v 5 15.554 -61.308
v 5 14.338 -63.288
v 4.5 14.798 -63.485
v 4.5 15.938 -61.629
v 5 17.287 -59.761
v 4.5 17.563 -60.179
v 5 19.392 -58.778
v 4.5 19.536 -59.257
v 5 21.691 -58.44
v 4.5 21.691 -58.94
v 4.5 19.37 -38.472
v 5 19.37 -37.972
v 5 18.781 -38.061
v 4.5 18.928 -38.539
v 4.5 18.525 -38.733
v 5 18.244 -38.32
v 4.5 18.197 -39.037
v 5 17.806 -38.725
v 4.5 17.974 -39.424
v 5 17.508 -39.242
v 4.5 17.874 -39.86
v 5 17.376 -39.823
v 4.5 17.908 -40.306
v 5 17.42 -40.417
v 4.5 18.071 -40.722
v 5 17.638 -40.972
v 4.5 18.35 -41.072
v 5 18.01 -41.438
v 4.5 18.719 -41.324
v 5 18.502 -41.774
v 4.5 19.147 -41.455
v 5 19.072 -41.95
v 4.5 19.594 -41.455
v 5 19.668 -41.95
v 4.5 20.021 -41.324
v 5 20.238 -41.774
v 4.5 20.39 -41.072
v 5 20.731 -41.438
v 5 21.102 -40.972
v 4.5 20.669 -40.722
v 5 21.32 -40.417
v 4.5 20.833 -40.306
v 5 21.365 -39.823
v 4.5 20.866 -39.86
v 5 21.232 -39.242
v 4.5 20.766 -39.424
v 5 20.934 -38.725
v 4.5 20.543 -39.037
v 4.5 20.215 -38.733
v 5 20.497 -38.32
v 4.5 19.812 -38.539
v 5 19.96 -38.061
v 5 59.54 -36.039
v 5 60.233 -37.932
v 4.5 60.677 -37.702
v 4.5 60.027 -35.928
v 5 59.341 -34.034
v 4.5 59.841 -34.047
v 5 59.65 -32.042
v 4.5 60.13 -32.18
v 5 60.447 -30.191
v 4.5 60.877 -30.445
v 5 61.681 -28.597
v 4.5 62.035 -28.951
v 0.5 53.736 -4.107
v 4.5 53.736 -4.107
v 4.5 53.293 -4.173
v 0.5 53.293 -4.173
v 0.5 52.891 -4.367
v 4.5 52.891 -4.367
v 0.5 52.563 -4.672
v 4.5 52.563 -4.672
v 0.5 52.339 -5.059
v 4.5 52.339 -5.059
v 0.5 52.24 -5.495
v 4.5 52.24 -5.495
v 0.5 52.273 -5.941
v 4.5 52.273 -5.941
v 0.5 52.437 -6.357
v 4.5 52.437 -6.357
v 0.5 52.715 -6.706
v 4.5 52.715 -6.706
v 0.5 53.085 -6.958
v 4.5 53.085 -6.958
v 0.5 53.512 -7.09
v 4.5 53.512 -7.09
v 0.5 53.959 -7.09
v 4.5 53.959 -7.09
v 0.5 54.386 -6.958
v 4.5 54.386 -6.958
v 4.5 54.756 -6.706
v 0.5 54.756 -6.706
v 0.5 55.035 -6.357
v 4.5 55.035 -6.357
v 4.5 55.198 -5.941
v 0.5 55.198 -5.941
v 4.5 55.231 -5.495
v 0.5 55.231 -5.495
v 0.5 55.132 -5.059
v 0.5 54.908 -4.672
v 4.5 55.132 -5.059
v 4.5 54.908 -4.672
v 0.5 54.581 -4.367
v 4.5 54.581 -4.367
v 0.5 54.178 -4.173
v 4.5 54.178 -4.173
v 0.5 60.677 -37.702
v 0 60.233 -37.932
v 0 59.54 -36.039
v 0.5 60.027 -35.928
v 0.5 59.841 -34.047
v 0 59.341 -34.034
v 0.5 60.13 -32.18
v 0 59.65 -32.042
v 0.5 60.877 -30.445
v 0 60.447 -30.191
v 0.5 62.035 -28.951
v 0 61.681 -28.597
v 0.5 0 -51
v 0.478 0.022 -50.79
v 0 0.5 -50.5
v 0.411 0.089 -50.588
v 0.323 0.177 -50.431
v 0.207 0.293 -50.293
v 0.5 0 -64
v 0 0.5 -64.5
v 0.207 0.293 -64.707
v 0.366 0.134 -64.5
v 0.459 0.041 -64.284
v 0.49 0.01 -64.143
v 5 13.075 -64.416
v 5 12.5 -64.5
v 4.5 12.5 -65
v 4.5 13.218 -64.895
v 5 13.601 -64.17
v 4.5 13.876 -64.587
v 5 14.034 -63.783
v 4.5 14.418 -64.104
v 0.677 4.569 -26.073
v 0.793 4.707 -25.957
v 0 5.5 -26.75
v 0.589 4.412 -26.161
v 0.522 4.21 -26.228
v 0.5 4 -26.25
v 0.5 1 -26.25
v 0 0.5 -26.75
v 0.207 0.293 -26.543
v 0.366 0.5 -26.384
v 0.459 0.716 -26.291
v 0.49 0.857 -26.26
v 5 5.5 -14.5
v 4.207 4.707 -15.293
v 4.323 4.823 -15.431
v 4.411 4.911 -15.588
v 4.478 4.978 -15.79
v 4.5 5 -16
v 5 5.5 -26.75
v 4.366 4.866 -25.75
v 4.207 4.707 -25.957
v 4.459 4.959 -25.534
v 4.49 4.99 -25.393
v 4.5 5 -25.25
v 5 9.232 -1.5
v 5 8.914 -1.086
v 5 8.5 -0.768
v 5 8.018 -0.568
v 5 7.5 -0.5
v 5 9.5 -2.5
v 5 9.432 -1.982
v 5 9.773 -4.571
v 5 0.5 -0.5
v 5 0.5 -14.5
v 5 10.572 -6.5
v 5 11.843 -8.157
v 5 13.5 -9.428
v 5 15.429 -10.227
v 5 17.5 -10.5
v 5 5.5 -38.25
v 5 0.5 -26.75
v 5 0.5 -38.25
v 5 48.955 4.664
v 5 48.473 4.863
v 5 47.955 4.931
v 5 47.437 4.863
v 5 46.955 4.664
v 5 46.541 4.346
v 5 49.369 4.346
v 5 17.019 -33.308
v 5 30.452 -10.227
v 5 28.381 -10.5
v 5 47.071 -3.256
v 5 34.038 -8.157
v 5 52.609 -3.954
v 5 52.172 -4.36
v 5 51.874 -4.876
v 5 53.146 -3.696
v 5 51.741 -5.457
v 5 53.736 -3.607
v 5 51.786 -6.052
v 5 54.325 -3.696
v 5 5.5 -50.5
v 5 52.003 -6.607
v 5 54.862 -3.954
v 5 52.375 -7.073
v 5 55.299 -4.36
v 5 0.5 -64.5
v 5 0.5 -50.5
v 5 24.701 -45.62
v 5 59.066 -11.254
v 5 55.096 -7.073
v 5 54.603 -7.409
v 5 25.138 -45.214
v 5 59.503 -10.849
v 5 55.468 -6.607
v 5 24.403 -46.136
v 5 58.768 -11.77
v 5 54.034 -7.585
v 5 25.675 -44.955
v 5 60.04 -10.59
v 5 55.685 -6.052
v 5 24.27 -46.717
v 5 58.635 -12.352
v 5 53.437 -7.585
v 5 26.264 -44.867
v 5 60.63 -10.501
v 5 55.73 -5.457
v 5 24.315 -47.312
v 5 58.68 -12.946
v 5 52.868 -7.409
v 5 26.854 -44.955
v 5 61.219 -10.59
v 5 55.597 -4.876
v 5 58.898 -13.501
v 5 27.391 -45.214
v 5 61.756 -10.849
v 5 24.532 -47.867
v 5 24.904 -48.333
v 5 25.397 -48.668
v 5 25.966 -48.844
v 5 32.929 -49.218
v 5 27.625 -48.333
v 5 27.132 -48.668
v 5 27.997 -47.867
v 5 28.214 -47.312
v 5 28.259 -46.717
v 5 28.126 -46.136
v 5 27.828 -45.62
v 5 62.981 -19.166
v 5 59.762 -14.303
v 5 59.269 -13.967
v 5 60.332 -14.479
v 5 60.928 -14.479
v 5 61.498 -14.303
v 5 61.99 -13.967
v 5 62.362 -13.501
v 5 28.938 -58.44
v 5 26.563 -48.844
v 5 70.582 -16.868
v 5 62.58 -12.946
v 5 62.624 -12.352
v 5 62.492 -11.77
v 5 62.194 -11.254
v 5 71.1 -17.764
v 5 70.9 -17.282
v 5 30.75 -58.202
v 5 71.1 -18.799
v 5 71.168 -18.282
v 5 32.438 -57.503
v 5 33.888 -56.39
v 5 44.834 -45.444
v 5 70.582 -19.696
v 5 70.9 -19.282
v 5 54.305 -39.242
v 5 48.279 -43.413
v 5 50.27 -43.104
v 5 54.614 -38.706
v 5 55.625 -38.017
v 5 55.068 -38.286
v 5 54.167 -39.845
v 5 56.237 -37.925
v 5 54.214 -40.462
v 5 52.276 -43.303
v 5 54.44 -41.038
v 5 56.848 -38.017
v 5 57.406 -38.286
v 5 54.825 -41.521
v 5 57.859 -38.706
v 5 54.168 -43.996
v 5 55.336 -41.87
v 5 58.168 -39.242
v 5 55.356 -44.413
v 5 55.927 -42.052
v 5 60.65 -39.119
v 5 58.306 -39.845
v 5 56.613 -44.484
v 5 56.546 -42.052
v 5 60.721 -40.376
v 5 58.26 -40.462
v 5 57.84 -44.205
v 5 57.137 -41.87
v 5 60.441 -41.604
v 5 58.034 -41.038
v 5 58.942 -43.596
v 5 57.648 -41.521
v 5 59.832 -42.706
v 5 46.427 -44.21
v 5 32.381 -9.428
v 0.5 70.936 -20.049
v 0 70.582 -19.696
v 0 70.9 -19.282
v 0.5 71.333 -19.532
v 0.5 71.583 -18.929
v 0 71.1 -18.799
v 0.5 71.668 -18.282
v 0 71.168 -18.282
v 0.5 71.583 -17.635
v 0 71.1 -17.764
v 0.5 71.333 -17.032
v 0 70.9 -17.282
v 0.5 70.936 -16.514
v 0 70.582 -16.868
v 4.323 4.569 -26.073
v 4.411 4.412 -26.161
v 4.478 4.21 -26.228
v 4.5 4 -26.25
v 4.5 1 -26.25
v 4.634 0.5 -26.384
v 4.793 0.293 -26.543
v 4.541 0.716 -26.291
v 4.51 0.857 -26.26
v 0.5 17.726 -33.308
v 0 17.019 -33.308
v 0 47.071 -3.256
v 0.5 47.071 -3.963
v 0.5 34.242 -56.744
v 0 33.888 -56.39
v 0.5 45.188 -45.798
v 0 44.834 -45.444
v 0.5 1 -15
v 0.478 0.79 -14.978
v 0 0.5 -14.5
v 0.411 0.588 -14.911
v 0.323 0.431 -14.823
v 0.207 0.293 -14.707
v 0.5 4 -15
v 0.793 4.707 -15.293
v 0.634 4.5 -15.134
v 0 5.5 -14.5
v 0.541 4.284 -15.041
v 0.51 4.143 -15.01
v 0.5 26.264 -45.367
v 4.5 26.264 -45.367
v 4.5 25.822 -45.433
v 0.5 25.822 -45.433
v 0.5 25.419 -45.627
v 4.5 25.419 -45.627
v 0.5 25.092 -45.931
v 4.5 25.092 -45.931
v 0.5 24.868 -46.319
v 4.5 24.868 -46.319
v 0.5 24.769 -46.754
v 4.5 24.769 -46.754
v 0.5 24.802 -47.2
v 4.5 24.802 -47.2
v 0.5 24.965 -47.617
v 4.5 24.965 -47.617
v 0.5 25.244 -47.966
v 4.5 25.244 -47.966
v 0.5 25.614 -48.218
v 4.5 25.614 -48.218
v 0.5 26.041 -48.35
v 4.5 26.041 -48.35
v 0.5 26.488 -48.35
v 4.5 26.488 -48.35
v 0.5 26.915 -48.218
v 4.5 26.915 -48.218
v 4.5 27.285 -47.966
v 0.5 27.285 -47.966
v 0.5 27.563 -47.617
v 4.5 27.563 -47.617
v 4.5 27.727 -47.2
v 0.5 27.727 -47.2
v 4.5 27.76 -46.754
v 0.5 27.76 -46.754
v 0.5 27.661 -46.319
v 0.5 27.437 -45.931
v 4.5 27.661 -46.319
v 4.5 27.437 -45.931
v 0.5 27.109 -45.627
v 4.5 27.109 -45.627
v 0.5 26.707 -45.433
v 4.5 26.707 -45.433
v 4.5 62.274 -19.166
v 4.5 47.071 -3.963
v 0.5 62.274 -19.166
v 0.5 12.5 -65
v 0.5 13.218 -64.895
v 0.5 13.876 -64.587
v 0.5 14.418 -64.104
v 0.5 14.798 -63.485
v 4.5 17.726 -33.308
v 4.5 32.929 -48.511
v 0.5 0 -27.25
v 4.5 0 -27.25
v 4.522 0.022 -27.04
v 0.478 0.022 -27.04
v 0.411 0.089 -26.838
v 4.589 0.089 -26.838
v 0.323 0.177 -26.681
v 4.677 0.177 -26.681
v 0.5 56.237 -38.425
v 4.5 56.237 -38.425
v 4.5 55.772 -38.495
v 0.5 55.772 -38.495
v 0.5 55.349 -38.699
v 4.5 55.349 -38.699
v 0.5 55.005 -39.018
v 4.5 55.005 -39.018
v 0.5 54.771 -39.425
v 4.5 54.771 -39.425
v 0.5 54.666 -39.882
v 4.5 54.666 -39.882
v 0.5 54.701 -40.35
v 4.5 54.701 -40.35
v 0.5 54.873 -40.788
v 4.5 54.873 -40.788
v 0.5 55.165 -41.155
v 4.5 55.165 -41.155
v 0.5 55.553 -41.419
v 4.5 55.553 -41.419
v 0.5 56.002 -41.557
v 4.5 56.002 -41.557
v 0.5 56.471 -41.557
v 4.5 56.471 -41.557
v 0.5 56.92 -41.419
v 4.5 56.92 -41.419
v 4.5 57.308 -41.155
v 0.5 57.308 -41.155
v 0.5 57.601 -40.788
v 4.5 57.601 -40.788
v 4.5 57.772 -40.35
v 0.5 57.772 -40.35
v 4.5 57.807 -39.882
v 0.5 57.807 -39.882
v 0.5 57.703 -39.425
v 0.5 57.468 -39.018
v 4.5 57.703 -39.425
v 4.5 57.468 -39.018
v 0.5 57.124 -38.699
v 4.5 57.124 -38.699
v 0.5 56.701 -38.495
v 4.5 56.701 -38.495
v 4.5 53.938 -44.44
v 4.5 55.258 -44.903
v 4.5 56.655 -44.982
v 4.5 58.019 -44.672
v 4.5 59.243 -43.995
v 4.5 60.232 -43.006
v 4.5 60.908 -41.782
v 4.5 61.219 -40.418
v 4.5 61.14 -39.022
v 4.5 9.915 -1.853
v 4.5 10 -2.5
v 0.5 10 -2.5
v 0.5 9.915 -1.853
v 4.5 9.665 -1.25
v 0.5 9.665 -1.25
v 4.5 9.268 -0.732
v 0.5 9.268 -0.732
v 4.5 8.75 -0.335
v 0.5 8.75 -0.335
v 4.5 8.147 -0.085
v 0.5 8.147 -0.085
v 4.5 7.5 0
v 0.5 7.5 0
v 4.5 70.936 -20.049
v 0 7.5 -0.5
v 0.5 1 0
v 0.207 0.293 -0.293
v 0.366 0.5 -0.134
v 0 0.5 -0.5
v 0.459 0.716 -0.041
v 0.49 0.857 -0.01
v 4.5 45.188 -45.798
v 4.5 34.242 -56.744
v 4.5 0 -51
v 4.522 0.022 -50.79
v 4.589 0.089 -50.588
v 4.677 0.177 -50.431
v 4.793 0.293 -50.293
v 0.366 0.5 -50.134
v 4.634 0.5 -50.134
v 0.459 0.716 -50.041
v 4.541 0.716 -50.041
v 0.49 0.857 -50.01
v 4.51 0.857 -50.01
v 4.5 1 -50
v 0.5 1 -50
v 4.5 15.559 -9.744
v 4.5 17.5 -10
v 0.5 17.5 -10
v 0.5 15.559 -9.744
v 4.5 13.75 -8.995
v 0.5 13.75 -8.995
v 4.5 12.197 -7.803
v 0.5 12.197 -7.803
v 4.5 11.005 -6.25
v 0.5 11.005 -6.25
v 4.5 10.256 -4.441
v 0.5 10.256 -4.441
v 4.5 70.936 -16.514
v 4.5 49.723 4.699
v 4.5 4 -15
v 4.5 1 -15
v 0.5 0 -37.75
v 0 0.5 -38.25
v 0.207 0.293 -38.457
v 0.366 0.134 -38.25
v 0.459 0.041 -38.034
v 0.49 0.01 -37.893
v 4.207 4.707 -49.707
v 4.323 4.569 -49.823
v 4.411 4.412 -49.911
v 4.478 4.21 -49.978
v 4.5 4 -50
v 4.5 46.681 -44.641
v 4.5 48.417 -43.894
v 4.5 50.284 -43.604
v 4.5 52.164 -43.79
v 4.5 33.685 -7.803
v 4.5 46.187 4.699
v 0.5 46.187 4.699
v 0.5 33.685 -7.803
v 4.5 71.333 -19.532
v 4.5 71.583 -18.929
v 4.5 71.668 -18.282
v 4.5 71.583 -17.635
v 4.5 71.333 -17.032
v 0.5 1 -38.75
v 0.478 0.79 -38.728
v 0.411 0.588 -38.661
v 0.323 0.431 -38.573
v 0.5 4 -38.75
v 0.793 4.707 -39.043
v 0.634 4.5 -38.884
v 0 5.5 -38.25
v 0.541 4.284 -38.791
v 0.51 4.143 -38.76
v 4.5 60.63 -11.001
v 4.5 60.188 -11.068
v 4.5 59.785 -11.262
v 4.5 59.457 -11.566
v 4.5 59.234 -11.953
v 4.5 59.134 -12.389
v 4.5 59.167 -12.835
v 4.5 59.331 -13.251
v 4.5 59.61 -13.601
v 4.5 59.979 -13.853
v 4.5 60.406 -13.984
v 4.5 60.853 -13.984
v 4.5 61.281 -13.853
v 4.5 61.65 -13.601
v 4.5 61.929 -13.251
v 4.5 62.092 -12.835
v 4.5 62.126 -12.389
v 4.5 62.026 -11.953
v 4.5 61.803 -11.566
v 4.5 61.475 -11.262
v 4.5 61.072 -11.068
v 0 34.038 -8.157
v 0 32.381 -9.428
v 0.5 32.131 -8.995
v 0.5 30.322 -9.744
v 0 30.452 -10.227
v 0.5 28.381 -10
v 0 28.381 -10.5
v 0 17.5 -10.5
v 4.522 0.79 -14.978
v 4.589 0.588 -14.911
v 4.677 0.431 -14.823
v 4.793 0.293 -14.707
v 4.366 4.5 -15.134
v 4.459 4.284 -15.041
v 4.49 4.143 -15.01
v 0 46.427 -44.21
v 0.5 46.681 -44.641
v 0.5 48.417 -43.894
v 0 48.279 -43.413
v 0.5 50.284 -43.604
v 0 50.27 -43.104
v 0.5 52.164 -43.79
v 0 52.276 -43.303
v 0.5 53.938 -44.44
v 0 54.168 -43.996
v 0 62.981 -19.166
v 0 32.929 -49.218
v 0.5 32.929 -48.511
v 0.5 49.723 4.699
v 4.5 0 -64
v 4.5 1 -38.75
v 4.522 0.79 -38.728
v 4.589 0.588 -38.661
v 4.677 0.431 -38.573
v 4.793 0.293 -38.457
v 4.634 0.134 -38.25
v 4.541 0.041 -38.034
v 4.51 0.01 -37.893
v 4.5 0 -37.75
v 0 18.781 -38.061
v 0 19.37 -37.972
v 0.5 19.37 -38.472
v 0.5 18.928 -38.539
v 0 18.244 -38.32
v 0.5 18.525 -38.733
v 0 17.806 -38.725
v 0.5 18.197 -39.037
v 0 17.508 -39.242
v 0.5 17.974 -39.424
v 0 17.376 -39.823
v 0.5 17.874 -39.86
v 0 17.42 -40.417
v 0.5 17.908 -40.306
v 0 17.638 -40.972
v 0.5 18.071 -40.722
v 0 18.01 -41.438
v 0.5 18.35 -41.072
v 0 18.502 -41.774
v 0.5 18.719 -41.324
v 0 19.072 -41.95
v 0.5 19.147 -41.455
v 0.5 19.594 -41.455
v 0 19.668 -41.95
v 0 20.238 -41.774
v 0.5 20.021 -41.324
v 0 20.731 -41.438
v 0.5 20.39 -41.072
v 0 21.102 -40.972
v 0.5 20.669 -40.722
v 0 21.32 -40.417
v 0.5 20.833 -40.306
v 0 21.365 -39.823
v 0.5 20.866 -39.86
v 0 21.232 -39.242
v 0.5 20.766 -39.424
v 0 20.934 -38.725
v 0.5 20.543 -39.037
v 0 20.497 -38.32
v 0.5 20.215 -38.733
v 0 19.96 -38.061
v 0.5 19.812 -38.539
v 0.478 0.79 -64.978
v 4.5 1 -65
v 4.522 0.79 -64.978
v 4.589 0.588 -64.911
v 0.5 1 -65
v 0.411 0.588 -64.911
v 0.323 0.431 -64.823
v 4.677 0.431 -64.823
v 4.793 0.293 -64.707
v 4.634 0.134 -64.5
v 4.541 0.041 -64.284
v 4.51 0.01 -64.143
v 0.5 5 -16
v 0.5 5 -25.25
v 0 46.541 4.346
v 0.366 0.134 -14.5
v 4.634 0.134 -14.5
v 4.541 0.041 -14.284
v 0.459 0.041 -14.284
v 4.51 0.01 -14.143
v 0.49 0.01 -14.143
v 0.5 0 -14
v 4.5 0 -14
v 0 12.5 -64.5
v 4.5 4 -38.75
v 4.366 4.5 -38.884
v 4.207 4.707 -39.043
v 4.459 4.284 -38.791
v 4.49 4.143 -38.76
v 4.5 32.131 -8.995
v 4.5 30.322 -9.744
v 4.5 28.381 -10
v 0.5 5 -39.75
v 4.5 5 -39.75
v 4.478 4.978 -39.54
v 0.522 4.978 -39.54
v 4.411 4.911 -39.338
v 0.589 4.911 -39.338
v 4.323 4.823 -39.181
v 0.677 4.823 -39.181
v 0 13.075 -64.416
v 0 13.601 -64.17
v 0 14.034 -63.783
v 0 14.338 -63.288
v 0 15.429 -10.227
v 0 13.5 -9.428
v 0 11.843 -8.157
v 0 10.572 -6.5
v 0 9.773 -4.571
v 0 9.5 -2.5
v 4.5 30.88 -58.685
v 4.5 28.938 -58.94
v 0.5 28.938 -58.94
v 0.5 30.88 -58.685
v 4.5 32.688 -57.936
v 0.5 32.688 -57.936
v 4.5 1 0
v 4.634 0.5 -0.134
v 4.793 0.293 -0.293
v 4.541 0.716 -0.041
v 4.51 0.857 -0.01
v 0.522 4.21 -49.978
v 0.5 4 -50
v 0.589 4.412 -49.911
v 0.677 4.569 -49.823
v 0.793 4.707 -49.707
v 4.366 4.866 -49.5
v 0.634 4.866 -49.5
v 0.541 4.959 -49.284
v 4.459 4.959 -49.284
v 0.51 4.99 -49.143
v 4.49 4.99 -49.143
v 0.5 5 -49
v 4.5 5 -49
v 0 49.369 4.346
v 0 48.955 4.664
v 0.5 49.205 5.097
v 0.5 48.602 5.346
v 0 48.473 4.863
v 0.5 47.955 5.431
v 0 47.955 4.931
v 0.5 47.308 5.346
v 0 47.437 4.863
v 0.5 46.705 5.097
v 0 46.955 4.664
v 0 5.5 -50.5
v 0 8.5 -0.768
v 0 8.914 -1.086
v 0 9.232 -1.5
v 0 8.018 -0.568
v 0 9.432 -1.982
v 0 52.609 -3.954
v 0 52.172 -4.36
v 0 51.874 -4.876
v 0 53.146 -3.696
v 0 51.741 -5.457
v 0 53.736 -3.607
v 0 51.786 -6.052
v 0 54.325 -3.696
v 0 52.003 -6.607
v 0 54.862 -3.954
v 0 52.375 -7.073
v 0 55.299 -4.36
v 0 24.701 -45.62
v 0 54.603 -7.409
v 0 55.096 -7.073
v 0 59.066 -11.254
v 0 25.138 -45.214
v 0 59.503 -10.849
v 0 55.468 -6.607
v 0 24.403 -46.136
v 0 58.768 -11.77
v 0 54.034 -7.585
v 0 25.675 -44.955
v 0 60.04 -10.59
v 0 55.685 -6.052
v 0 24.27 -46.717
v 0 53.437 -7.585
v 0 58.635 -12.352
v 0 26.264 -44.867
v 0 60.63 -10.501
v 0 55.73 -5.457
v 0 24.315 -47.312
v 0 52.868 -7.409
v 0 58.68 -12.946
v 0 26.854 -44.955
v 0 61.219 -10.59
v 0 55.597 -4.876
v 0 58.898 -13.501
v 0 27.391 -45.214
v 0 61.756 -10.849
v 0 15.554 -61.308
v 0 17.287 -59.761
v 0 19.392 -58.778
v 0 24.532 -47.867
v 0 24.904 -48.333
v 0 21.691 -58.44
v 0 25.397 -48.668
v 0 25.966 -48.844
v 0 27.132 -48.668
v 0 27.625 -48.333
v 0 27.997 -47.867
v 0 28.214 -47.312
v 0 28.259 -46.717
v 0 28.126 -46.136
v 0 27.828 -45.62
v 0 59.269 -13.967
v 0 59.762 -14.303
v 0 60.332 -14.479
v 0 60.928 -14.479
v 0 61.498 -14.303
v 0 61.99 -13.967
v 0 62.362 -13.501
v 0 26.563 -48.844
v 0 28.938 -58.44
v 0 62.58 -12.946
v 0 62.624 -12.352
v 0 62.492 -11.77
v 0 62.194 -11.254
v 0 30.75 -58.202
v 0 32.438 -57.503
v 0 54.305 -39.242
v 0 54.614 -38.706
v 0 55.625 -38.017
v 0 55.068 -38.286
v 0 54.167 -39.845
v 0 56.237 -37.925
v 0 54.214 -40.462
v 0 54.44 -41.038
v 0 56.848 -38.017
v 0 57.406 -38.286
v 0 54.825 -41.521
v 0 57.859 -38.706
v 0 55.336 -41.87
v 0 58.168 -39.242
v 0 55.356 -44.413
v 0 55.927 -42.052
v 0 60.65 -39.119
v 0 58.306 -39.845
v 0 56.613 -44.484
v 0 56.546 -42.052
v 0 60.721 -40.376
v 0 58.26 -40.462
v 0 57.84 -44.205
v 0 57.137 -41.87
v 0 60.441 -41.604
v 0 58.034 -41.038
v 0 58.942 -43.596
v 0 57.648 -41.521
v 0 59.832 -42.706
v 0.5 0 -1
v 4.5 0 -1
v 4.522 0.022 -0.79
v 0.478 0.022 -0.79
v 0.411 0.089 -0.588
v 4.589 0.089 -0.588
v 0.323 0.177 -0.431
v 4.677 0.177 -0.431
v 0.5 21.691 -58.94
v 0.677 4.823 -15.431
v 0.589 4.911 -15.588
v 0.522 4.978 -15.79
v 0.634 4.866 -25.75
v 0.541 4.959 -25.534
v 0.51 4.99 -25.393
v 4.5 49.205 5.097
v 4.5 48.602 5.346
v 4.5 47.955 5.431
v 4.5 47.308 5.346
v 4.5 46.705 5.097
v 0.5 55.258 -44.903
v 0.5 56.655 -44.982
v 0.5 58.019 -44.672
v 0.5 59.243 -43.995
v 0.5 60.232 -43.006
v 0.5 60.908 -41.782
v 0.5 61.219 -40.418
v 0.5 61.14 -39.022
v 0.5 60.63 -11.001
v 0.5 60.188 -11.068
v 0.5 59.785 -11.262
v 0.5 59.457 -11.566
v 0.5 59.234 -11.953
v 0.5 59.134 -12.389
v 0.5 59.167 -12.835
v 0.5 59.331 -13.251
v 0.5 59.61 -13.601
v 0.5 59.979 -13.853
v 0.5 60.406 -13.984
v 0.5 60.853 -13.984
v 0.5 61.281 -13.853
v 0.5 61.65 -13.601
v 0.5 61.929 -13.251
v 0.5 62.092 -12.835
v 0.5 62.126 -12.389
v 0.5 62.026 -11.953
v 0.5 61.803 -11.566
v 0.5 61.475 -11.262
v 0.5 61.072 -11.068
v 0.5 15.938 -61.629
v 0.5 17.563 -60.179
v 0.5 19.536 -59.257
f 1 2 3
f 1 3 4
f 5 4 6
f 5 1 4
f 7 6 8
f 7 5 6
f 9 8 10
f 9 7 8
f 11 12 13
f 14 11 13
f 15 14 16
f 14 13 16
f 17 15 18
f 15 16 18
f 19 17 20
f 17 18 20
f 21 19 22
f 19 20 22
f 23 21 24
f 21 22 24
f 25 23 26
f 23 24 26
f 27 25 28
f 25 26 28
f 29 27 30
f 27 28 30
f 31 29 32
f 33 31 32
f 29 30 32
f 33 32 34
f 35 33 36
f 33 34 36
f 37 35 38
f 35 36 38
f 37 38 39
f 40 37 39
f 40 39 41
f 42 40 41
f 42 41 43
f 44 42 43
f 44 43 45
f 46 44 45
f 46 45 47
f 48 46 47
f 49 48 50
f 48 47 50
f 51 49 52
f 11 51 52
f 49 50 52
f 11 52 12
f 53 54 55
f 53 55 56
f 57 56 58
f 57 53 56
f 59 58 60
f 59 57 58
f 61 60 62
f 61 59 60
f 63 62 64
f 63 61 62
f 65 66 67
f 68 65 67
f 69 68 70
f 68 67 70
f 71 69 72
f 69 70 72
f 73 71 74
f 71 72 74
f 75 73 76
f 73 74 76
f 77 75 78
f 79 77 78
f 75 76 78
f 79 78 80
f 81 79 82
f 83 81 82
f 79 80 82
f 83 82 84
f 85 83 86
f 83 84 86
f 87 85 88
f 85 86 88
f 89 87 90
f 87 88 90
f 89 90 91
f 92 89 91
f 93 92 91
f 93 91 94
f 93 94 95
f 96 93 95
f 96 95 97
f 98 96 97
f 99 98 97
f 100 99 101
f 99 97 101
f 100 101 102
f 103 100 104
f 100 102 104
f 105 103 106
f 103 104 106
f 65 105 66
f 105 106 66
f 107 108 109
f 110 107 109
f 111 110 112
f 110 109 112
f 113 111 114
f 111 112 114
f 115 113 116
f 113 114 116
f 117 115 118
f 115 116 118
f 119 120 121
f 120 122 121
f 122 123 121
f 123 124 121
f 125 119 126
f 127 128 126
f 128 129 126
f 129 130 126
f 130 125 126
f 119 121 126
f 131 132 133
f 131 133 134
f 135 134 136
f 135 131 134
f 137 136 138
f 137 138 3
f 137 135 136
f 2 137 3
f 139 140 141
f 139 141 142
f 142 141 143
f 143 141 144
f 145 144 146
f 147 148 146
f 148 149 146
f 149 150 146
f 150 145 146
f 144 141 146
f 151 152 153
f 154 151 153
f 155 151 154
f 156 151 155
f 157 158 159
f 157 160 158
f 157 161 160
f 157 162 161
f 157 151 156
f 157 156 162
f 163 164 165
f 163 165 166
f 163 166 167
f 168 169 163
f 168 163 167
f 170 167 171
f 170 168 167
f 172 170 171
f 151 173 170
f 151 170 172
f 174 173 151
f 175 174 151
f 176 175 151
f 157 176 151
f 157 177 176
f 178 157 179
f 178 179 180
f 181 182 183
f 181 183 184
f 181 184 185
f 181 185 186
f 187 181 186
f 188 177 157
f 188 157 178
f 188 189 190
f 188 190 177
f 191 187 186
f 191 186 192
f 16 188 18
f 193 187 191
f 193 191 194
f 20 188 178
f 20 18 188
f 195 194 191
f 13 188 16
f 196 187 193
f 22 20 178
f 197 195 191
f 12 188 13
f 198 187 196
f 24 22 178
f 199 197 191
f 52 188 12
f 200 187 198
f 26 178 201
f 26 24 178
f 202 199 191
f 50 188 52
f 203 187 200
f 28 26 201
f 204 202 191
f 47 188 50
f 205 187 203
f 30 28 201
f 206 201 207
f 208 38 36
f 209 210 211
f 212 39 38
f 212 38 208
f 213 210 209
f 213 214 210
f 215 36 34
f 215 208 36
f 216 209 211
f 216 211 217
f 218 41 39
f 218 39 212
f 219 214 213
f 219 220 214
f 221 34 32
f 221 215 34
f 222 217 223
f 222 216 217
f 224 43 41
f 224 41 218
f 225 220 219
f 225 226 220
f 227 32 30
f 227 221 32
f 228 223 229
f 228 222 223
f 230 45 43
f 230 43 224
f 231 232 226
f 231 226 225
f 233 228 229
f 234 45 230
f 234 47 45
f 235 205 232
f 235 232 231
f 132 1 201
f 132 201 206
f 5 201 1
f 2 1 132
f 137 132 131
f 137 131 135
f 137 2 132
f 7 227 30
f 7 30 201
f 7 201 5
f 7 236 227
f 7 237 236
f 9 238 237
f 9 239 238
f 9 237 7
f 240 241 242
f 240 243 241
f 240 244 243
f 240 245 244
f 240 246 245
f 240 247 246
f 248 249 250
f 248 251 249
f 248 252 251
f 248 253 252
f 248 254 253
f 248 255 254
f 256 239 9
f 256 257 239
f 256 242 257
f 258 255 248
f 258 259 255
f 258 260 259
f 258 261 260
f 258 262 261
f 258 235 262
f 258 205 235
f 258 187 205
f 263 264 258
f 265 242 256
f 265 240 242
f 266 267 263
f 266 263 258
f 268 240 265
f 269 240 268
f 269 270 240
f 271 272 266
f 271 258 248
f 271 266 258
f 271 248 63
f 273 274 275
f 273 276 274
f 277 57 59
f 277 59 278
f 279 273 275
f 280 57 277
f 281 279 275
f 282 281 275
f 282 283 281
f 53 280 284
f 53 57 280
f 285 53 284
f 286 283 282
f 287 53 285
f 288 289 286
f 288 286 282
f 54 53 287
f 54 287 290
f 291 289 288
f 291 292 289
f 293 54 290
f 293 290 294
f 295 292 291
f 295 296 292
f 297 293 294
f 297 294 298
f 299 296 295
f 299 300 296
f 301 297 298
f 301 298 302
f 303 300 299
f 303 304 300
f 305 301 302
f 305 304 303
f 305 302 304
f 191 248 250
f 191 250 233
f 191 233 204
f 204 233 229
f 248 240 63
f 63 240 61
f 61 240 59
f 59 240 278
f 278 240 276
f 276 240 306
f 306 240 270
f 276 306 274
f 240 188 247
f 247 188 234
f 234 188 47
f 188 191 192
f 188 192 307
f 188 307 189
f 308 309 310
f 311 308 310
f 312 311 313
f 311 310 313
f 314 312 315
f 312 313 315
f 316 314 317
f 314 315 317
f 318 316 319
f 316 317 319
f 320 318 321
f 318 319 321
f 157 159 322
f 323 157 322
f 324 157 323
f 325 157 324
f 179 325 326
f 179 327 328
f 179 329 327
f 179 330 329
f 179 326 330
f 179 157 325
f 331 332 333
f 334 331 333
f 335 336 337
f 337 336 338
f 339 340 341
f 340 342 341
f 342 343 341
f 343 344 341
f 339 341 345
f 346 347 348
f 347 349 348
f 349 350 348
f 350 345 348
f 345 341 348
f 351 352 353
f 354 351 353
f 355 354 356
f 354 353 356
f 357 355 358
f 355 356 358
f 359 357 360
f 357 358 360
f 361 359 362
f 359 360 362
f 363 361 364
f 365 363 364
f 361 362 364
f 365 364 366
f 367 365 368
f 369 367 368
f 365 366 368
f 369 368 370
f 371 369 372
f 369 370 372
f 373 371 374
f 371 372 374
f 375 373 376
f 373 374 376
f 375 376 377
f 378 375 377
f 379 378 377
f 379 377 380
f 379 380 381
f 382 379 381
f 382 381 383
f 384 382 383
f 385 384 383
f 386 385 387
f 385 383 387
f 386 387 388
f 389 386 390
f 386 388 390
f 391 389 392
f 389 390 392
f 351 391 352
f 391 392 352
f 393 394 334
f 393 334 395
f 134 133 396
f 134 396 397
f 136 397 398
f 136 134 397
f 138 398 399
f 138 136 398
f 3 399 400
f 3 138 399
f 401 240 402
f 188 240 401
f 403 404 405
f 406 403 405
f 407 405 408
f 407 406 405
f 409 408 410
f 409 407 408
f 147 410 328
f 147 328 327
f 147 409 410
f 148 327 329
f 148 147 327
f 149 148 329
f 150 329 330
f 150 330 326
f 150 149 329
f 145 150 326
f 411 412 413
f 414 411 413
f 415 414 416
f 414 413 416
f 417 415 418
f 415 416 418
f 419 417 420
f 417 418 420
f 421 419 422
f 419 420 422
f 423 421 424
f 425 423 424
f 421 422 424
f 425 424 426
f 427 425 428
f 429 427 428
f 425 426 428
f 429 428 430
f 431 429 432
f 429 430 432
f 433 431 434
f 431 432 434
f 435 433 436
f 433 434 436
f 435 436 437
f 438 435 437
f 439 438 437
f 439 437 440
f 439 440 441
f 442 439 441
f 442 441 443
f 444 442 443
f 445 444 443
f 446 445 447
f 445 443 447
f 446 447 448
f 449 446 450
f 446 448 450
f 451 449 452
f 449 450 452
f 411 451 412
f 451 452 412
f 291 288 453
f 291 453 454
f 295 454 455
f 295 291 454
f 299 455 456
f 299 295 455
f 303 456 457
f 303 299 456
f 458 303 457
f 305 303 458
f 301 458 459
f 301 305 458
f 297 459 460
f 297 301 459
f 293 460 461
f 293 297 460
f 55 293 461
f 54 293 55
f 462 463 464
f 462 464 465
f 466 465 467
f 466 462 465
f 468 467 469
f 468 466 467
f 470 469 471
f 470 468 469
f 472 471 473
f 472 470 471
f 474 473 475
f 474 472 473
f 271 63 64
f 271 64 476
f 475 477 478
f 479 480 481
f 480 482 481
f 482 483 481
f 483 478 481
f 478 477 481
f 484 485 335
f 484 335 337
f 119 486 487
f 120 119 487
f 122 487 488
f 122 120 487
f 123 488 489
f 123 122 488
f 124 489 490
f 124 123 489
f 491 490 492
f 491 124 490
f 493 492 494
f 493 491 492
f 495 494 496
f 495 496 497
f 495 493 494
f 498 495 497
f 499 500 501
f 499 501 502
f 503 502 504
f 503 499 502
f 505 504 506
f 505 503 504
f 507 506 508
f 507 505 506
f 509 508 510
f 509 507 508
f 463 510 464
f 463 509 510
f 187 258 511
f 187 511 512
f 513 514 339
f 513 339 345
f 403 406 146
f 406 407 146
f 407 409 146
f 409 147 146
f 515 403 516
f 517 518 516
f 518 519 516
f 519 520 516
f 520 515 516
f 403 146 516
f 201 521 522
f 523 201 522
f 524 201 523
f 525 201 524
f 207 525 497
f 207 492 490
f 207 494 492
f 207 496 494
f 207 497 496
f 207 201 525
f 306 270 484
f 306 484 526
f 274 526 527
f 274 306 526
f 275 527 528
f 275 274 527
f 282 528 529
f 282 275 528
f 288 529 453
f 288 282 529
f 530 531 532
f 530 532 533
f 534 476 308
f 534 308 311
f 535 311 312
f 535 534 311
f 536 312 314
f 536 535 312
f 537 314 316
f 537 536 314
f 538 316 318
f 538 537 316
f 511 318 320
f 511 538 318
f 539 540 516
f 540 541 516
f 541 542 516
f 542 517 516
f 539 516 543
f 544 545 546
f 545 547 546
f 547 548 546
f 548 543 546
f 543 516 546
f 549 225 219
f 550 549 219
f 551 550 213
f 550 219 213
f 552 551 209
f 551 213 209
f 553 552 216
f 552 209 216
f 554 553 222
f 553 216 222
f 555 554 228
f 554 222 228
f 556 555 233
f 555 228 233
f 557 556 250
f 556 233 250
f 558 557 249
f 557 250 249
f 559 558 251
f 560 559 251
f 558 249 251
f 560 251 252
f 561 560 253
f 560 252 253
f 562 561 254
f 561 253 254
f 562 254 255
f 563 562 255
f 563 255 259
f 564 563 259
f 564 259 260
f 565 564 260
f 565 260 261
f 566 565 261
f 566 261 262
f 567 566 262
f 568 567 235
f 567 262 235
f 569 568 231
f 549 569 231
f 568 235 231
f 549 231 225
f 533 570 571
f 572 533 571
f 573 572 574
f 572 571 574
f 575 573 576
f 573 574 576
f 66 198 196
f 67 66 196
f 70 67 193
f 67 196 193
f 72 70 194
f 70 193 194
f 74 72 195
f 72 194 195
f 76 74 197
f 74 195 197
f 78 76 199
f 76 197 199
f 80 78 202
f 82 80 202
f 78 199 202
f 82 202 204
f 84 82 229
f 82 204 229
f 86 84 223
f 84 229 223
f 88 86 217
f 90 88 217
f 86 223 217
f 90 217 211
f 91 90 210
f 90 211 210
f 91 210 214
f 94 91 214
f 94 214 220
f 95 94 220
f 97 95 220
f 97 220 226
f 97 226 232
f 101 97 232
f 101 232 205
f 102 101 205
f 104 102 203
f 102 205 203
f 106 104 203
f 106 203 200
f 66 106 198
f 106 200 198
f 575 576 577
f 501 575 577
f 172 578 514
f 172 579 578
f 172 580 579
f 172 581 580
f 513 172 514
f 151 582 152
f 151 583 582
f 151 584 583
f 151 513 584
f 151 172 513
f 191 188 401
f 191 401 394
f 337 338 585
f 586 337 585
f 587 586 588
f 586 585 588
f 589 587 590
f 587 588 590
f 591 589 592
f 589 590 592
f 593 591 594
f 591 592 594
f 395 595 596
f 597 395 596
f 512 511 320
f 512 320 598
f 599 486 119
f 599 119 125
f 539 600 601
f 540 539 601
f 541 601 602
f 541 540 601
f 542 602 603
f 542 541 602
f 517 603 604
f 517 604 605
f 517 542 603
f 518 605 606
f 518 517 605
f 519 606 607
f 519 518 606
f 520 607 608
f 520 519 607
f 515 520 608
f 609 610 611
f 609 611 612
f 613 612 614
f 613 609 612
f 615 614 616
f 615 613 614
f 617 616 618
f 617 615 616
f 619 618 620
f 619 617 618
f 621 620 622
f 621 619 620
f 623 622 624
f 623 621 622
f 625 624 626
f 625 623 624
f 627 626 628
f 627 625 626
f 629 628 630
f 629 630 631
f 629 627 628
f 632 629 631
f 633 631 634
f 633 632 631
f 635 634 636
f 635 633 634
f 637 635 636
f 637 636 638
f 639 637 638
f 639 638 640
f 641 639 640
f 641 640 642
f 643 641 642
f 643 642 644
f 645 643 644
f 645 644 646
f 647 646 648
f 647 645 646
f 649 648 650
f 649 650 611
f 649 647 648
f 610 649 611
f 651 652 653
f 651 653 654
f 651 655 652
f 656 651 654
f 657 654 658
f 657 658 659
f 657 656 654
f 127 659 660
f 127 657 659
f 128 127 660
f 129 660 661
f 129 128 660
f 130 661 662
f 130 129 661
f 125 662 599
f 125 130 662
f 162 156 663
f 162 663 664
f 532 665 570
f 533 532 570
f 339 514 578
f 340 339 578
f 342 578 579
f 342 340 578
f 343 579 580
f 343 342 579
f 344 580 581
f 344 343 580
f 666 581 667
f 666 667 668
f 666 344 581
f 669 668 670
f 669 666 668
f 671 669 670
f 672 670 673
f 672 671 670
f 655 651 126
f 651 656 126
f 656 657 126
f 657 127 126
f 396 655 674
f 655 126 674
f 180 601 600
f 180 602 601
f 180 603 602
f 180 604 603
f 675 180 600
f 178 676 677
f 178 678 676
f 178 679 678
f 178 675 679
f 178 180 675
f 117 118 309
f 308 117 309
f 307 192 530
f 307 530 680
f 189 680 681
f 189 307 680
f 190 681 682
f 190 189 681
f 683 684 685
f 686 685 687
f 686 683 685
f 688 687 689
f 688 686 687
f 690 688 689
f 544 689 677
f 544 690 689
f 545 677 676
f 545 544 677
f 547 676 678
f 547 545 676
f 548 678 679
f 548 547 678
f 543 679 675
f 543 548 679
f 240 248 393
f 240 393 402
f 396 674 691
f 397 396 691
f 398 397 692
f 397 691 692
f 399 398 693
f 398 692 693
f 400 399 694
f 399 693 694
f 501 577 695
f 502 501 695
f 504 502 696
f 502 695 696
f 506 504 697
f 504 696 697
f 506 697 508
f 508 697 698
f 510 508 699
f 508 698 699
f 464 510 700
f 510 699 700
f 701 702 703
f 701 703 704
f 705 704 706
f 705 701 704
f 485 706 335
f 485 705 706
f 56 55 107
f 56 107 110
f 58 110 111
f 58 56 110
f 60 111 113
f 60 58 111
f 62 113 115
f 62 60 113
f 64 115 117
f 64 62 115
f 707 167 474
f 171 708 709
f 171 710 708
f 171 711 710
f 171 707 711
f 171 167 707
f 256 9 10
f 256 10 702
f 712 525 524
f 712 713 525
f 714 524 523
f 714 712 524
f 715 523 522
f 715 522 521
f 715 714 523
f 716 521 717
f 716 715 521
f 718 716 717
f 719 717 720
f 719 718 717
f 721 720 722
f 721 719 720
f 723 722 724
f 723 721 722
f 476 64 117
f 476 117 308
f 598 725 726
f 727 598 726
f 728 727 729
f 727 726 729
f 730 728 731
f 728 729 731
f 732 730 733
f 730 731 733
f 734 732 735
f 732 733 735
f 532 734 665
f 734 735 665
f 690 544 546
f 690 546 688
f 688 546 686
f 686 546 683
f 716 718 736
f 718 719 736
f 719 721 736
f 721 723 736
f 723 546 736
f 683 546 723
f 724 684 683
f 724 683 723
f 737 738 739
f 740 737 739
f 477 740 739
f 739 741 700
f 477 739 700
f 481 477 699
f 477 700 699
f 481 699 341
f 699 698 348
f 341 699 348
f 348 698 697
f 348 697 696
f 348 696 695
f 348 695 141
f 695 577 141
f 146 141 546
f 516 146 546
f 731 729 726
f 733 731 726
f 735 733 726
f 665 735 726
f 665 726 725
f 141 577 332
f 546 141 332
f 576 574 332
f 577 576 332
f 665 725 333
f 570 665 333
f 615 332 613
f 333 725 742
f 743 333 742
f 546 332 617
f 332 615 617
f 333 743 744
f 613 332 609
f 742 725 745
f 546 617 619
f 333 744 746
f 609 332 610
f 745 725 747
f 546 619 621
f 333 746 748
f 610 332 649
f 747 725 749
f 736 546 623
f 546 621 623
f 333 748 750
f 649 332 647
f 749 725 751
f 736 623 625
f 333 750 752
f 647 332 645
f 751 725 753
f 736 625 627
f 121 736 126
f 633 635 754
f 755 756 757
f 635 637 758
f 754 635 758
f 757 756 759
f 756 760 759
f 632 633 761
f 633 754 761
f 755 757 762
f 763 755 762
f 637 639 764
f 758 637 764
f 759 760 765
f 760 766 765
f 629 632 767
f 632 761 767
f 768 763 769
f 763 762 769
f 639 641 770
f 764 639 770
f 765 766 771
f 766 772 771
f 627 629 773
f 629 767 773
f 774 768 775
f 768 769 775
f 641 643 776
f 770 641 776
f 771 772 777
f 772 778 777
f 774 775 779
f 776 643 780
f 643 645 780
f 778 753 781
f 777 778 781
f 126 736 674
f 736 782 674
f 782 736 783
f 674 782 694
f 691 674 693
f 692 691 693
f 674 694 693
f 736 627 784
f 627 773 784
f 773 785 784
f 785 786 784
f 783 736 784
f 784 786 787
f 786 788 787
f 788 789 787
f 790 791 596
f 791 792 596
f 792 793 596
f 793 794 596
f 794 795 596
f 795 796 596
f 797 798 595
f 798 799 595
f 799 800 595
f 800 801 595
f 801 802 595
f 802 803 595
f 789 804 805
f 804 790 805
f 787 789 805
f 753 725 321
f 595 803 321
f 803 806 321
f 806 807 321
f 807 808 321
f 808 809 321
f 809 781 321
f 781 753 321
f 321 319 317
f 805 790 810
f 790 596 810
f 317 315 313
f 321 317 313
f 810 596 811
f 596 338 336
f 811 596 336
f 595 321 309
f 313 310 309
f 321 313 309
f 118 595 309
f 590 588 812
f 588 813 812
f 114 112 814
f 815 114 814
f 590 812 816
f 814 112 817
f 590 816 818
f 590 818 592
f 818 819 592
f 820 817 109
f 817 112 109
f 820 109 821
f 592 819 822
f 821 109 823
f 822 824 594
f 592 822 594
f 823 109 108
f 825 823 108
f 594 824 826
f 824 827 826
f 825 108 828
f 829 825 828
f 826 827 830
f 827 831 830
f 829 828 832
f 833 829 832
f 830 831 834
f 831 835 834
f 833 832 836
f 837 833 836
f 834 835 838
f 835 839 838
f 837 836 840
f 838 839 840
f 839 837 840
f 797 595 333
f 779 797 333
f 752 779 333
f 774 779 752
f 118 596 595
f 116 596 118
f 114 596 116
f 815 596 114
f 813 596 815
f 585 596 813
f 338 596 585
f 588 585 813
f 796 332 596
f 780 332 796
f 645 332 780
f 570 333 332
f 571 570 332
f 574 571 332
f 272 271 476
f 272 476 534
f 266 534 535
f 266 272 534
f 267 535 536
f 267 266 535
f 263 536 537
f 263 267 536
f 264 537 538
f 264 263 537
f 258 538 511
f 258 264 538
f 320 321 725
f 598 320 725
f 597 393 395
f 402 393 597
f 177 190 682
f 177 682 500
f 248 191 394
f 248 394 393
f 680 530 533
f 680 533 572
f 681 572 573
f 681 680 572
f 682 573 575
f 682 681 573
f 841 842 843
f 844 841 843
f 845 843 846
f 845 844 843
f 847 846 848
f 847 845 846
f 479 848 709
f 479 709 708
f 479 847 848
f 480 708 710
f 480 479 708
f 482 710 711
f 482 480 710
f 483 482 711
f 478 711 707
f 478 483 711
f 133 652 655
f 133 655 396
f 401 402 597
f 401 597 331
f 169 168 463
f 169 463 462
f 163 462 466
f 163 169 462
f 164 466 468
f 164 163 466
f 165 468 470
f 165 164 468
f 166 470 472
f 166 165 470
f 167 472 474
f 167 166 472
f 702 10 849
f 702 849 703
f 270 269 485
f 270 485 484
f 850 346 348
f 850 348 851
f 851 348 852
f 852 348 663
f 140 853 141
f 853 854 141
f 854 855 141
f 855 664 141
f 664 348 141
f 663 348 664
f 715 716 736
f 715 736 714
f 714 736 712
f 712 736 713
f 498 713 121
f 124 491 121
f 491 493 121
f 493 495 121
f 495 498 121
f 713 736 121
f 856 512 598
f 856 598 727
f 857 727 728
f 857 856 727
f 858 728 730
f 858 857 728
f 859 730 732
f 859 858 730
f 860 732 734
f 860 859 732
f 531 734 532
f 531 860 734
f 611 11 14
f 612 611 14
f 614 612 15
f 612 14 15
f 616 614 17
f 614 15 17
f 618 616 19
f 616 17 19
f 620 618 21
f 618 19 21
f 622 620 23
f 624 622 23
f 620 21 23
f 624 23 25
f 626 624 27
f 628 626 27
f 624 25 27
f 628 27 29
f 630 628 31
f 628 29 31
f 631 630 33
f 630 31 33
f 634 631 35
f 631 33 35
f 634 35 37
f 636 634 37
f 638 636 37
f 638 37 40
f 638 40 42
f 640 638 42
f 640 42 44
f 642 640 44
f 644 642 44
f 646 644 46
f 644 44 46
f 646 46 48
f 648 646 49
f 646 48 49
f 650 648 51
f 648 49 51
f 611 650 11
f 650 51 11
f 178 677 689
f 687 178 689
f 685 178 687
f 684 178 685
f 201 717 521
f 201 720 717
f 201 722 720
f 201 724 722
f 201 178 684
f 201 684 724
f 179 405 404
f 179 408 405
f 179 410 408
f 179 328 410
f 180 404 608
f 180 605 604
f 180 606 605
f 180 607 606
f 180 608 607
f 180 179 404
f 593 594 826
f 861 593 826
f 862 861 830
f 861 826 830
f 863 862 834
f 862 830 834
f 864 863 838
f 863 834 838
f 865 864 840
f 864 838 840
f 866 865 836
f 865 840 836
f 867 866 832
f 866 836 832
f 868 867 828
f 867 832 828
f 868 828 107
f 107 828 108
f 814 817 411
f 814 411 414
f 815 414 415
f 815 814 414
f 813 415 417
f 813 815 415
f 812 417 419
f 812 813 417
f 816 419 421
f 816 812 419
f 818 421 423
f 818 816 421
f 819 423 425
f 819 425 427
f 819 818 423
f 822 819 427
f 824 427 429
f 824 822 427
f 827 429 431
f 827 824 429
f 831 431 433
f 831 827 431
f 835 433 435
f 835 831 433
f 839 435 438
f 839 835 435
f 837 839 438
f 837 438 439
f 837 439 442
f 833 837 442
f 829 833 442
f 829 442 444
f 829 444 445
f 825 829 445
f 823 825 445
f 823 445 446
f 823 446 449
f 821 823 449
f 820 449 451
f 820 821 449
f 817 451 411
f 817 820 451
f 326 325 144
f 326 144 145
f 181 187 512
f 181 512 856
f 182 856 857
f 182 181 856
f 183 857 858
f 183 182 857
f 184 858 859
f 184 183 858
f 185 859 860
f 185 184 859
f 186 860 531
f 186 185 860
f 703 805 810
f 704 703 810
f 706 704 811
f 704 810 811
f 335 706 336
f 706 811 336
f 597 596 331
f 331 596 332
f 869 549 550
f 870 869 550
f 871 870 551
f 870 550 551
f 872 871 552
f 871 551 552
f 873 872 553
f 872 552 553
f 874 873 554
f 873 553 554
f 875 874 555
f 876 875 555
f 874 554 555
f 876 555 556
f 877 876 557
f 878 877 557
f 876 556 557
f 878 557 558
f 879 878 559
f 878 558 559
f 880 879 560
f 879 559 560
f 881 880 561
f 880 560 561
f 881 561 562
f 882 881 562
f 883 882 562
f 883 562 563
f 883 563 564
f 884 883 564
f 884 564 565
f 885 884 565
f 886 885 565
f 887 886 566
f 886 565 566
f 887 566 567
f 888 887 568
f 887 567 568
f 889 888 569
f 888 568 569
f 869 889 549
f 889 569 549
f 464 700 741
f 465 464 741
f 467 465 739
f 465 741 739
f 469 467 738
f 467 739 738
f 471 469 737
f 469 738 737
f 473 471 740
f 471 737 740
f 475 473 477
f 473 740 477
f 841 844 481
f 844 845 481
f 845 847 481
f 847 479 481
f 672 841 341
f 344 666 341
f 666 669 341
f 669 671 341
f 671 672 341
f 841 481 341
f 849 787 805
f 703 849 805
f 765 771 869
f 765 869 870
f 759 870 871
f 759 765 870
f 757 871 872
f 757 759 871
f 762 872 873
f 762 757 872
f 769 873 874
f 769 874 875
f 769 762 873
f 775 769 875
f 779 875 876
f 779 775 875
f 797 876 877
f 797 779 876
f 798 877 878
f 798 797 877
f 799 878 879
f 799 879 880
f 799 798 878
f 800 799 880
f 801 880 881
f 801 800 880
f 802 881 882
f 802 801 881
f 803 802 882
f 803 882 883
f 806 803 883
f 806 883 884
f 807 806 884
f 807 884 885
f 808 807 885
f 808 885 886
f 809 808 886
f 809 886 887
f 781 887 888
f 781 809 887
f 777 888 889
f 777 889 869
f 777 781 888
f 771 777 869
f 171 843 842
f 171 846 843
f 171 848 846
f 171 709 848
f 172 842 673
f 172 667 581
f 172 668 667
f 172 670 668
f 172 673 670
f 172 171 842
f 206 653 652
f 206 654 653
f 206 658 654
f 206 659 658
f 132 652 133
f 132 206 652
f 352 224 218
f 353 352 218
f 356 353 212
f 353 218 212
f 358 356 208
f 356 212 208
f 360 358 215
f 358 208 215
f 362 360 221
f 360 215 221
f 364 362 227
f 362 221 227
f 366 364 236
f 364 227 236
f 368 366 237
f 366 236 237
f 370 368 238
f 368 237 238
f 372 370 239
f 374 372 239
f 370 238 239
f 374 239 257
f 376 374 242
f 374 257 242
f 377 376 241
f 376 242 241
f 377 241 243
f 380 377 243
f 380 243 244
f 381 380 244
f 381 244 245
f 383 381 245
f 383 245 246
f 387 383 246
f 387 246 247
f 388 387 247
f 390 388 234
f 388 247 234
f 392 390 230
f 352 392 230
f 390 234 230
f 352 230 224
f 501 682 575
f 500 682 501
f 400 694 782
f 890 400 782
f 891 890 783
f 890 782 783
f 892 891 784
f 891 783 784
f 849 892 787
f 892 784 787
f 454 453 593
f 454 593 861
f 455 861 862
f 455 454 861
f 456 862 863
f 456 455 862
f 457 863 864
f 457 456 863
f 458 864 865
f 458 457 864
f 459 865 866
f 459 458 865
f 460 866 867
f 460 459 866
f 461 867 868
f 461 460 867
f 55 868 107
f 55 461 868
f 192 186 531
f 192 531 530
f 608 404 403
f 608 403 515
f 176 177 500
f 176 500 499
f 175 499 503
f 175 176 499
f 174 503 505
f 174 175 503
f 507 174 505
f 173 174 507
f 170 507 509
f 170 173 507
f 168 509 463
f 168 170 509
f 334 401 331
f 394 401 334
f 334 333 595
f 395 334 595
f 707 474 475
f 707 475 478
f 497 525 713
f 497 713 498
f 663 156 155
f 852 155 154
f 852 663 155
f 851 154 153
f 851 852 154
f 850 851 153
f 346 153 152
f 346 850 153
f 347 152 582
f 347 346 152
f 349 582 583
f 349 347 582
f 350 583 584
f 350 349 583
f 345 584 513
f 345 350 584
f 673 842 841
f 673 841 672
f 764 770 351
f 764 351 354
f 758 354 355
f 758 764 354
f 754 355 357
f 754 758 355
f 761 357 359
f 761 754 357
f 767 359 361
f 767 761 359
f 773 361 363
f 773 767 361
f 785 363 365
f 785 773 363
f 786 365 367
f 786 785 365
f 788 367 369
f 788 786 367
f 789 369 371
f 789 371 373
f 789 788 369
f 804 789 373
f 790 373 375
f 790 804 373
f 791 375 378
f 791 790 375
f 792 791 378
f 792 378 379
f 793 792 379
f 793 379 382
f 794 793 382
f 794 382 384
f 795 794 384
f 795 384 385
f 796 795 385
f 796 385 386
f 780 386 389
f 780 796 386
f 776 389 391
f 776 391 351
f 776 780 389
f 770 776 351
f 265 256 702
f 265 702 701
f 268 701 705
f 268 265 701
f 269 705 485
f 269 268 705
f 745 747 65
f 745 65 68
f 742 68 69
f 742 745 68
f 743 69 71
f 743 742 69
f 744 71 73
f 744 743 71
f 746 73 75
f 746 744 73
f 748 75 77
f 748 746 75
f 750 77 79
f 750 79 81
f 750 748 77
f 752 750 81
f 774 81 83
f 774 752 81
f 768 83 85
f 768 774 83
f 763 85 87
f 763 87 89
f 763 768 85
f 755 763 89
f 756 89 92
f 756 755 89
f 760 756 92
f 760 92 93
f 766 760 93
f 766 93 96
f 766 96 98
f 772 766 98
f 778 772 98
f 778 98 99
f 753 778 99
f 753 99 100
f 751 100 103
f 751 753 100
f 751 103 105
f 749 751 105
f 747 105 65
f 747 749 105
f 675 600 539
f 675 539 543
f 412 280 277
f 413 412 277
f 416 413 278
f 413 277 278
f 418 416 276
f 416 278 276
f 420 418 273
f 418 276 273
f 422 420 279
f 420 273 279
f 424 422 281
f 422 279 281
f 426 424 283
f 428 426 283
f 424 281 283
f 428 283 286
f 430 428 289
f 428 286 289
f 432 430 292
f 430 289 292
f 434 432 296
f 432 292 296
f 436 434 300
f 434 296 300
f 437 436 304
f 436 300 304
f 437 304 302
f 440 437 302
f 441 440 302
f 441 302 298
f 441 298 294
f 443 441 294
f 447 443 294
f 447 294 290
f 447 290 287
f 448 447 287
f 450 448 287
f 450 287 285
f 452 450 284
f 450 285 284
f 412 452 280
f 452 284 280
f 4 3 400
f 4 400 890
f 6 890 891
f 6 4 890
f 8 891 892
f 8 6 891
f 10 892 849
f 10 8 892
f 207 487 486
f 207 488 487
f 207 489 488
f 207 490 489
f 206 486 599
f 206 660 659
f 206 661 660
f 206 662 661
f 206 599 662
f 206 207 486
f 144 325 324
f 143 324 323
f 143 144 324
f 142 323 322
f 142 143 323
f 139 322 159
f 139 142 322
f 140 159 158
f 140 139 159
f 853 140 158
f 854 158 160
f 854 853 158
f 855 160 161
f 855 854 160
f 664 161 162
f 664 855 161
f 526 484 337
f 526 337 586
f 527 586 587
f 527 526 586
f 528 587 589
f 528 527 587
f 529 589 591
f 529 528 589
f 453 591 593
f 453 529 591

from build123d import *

# Parameters (mm, degrees)
SKETCH_1_R      = 1.575
SKETCH_1_R_2    = 1.5
EXTRUDE_1_DEPTH = 5
CHAMFER_1_SIZE  = 0.5
FILLET_1_R      = 1


with BuildPart() as part:
    # 草图1 → 凸台-拉伸1 (new body)
    with BuildSketch(Plane(origin=(5, 0, 0), x_dir=(0, 0, -1), z_dir=(1, 0, 0))):
        with BuildLine():
            Line((58.94037044, 21.690945588), (58.94037044, 28.938446994))
            ThreePointArc((58.94037044, 28.938446994), (58.369466934, 31.808572737), (56.743671299, 34.241747853))
            Line((56.743671299, 34.241747853), (45.79785286, 45.187566291))
            ThreePointArc((45.79785286, 45.187566291), (43.689786601, 49.341242238), (44.440461488, 53.938355946))
            ThreePointArc((44.440461488, 53.938355946), (43.535533906, 59.772215716), (37.701674136, 60.677143298))
            ThreePointArc((37.701674136, 60.677143298), (33.104560428, 59.926468411), (28.950884481, 62.03453467))
            Line((28.950884481, 62.03453467), (20.049497475, 70.935921677))
            ThreePointArc((20.049497475, 70.935921677), (18.281730522, 71.668154724), (16.513963569, 70.935921677))
            Line((16.513963569, 70.935921677), (-4.699239867, 49.722718241))
            ThreePointArc((-4.699239867, 49.722718241), (-5.431472914, 47.954951288), (-4.699239867, 46.187184335))
            Line((-4.699239867, 46.187184335), (7.803300859, 33.68464361))
            ThreePointArc((7.803300859, 33.68464361), (9.429096494, 31.251468493), (10, 28.381342751))
            Line((10, 28.381342751), (10, 17.5))
            ThreePointArc((10, 17.5), (7.803300859, 12.196699141), (2.5, 10))
            ThreePointArc((2.5, 10), (0.732233047, 9.267766953), (0, 7.5))
            Line((0, 7.5), (0, 0))
            Line((0, 0), (15, 0))
            Line((15, 0), (15, 5))
            Line((15, 5), (26.25, 5))
            Line((26.25, 5), (26.25, 0))
            Line((26.25, 0), (38.75, 0))
            Line((38.75, 0), (38.75, 5))
            Line((38.75, 5), (50, 5))
            Line((50, 5), (50, 0))
            Line((50, 0), (65, 0))
            Line((65, 0), (65, 12.5))
            ThreePointArc((65, 12.5), (64.587190878, 13.876093833), (63.48509261, 14.797736397))
            ThreePointArc((63.48509261, 14.797736397), (60.178797805, 17.562664088), (58.94037044, 21.690945588))
        make_face()
        with Locations(Location((40, 56.23668181, 0), (0, 0, 180))):
            Circle(SKETCH_1_R, mode=Mode.SUBTRACT)
        with Locations(Location((39.972231035, 19.370159659, 0), (0, 0, 180))):
            Circle(SKETCH_1_R_2, mode=Mode.SUBTRACT)
        with Locations(Location((12.501132586, 60.629840341, 0), (0, 0, 180))):
            Circle(SKETCH_1_R_2, mode=Mode.SUBTRACT)
        with Locations(Location((5.606841469, 53.735549225, 0), (0, 0, 180))):
            Circle(SKETCH_1_R_2, mode=Mode.SUBTRACT)
        with Locations(Location((46.866522151, 26.264450775, 0), (0, 0, 180))):
            Circle(SKETCH_1_R_2, mode=Mode.SUBTRACT)
        Polygon((19.165613998, 62.273863607), (48.510545417, 32.928932188), (33.307749622, 17.726136393), (3.962818203, 47.071067812), align=None, mode=Mode.SUBTRACT)
    extrude(amount=-EXTRUDE_1_DEPTH)

    # 倒角1
    chamfer_1_edges = [part.edges().sort_by_distance(p)[0] for p in [
        (0, 5, -44.375),
        (0, 2.5, -50),
        (0, 0, -57.5),
        (0, 6.25, -65),
        (0, 25.314696291, -58.94037044),
        (0, 31.808572737, -58.369466934),
        (0, 39.714657072, -51.27076208),
        (0, 49.341242238, -43.689786601),
        (5, 6.25, -65),
        (5, 0, -57.5),
        (5, 2.5, -50),
        (5, 5, -44.375),
        (5, 2.5, -38.75),
        (5, 0, -32.5),
        (0, 59.772215716, -43.535533906),
        (5, 2.5, -26.25),
        (5, 5, -20.625),
        (5, 2.5, -15),
        (5, 0, -7.5),
        (5, 3.75, 0),
        (5, 9.267766953, -0.732233047),
        (5, 12.196699141, -7.803300859),
        (5, 22.940671375, -10),
        (5, 31.251468493, -9.429096494),
        (5, 39.935913973, -1.552030496),
        (0, 59.926468411, -33.104560428),
        (5, 47.954951288, 5.431472914),
        (5, 60.329319959, -5.907361851),
        (5, 71.668154724, -18.281730522),
        (5, 66.485228174, -24.500190978),
        (5, 59.926468411, -33.104560428),
        (5, 59.772215716, -43.535533906),
        (5, 49.341242238, -43.689786601),
        (5, 39.714657072, -51.27076208),
        (5, 31.808572737, -58.369466934),
        (5, 25.314696291, -58.94037044),
        (0, 66.485228174, -24.500190978),
        (5, 17.562664088, -60.178797805),
        (5, 13.876093833, -64.587190878),
        (0, 71.668154724, -18.281730522),
        (0, 60.329319959, -5.907361851),
        (0, 47.954951288, 5.431472914),
        (0, 13.876093833, -64.587190878),
        (0, 39.935913973, -1.552030496),
        (0, 31.251468493, -9.429096494),
        (0, 22.940671375, -10),
        (0, 12.196699141, -7.803300859),
        (0, 56.23668181, -41.575),
        (5, 56.23668181, -41.575),
        (0, 9.267766953, -0.732233047),
        (0, 19.370159659, -41.472231035),
        (5, 19.370159659, -41.472231035),
        (0, 3.75, 0),
        (0, 0, -7.5),
        (0, 54.67246571, -11.5642161),
        (0, 47.601397898, -33.838079708),
        (0, 25.32753429, -40.90914752),
        (0, 32.398602102, -18.635283912),
        (5, 54.67246571, -11.5642161),
        (5, 32.398602102, -18.635283912),
        (5, 25.32753429, -40.90914752),
        (5, 47.601397898, -33.838079708),
        (0, 2.5, -15),
        (0, 5, -20.625),
        (0, 60.629840341, -14.001132586),
        (5, 60.629840341, -14.001132586),
        (0, 2.5, -26.25),
        (0, 17.562664088, -60.178797805),
        (0, 53.735549225, -7.106841469),
        (5, 53.735549225, -7.106841469),
        (0, 0, -32.5),
        (0, 26.264450775, -48.366522151),
        (5, 26.264450775, -48.366522151),
        (0, 2.5, -38.75),
    ]]
    chamfer(chamfer_1_edges, length=CHAMFER_1_SIZE)

    # 圆角1
    fillet_1_edges = [part.edges().sort_by_distance(p)[0] for p in [
        (2.5, 0, 0),
        (2.5, 0, -15),
        (2.5, 5, -15),
        (2.5, 5, -26.25),
        (2.5, 0, -26.25),
        (2.5, 0, -38.75),
        (2.5, 5, -38.75),
        (2.5, 5, -50),
        (2.5, 0, -50),
        (2.5, 0, -65),
    ]]
    fillet(fillet_1_edges, radius=FILLET_1_R)


solid = part.part
